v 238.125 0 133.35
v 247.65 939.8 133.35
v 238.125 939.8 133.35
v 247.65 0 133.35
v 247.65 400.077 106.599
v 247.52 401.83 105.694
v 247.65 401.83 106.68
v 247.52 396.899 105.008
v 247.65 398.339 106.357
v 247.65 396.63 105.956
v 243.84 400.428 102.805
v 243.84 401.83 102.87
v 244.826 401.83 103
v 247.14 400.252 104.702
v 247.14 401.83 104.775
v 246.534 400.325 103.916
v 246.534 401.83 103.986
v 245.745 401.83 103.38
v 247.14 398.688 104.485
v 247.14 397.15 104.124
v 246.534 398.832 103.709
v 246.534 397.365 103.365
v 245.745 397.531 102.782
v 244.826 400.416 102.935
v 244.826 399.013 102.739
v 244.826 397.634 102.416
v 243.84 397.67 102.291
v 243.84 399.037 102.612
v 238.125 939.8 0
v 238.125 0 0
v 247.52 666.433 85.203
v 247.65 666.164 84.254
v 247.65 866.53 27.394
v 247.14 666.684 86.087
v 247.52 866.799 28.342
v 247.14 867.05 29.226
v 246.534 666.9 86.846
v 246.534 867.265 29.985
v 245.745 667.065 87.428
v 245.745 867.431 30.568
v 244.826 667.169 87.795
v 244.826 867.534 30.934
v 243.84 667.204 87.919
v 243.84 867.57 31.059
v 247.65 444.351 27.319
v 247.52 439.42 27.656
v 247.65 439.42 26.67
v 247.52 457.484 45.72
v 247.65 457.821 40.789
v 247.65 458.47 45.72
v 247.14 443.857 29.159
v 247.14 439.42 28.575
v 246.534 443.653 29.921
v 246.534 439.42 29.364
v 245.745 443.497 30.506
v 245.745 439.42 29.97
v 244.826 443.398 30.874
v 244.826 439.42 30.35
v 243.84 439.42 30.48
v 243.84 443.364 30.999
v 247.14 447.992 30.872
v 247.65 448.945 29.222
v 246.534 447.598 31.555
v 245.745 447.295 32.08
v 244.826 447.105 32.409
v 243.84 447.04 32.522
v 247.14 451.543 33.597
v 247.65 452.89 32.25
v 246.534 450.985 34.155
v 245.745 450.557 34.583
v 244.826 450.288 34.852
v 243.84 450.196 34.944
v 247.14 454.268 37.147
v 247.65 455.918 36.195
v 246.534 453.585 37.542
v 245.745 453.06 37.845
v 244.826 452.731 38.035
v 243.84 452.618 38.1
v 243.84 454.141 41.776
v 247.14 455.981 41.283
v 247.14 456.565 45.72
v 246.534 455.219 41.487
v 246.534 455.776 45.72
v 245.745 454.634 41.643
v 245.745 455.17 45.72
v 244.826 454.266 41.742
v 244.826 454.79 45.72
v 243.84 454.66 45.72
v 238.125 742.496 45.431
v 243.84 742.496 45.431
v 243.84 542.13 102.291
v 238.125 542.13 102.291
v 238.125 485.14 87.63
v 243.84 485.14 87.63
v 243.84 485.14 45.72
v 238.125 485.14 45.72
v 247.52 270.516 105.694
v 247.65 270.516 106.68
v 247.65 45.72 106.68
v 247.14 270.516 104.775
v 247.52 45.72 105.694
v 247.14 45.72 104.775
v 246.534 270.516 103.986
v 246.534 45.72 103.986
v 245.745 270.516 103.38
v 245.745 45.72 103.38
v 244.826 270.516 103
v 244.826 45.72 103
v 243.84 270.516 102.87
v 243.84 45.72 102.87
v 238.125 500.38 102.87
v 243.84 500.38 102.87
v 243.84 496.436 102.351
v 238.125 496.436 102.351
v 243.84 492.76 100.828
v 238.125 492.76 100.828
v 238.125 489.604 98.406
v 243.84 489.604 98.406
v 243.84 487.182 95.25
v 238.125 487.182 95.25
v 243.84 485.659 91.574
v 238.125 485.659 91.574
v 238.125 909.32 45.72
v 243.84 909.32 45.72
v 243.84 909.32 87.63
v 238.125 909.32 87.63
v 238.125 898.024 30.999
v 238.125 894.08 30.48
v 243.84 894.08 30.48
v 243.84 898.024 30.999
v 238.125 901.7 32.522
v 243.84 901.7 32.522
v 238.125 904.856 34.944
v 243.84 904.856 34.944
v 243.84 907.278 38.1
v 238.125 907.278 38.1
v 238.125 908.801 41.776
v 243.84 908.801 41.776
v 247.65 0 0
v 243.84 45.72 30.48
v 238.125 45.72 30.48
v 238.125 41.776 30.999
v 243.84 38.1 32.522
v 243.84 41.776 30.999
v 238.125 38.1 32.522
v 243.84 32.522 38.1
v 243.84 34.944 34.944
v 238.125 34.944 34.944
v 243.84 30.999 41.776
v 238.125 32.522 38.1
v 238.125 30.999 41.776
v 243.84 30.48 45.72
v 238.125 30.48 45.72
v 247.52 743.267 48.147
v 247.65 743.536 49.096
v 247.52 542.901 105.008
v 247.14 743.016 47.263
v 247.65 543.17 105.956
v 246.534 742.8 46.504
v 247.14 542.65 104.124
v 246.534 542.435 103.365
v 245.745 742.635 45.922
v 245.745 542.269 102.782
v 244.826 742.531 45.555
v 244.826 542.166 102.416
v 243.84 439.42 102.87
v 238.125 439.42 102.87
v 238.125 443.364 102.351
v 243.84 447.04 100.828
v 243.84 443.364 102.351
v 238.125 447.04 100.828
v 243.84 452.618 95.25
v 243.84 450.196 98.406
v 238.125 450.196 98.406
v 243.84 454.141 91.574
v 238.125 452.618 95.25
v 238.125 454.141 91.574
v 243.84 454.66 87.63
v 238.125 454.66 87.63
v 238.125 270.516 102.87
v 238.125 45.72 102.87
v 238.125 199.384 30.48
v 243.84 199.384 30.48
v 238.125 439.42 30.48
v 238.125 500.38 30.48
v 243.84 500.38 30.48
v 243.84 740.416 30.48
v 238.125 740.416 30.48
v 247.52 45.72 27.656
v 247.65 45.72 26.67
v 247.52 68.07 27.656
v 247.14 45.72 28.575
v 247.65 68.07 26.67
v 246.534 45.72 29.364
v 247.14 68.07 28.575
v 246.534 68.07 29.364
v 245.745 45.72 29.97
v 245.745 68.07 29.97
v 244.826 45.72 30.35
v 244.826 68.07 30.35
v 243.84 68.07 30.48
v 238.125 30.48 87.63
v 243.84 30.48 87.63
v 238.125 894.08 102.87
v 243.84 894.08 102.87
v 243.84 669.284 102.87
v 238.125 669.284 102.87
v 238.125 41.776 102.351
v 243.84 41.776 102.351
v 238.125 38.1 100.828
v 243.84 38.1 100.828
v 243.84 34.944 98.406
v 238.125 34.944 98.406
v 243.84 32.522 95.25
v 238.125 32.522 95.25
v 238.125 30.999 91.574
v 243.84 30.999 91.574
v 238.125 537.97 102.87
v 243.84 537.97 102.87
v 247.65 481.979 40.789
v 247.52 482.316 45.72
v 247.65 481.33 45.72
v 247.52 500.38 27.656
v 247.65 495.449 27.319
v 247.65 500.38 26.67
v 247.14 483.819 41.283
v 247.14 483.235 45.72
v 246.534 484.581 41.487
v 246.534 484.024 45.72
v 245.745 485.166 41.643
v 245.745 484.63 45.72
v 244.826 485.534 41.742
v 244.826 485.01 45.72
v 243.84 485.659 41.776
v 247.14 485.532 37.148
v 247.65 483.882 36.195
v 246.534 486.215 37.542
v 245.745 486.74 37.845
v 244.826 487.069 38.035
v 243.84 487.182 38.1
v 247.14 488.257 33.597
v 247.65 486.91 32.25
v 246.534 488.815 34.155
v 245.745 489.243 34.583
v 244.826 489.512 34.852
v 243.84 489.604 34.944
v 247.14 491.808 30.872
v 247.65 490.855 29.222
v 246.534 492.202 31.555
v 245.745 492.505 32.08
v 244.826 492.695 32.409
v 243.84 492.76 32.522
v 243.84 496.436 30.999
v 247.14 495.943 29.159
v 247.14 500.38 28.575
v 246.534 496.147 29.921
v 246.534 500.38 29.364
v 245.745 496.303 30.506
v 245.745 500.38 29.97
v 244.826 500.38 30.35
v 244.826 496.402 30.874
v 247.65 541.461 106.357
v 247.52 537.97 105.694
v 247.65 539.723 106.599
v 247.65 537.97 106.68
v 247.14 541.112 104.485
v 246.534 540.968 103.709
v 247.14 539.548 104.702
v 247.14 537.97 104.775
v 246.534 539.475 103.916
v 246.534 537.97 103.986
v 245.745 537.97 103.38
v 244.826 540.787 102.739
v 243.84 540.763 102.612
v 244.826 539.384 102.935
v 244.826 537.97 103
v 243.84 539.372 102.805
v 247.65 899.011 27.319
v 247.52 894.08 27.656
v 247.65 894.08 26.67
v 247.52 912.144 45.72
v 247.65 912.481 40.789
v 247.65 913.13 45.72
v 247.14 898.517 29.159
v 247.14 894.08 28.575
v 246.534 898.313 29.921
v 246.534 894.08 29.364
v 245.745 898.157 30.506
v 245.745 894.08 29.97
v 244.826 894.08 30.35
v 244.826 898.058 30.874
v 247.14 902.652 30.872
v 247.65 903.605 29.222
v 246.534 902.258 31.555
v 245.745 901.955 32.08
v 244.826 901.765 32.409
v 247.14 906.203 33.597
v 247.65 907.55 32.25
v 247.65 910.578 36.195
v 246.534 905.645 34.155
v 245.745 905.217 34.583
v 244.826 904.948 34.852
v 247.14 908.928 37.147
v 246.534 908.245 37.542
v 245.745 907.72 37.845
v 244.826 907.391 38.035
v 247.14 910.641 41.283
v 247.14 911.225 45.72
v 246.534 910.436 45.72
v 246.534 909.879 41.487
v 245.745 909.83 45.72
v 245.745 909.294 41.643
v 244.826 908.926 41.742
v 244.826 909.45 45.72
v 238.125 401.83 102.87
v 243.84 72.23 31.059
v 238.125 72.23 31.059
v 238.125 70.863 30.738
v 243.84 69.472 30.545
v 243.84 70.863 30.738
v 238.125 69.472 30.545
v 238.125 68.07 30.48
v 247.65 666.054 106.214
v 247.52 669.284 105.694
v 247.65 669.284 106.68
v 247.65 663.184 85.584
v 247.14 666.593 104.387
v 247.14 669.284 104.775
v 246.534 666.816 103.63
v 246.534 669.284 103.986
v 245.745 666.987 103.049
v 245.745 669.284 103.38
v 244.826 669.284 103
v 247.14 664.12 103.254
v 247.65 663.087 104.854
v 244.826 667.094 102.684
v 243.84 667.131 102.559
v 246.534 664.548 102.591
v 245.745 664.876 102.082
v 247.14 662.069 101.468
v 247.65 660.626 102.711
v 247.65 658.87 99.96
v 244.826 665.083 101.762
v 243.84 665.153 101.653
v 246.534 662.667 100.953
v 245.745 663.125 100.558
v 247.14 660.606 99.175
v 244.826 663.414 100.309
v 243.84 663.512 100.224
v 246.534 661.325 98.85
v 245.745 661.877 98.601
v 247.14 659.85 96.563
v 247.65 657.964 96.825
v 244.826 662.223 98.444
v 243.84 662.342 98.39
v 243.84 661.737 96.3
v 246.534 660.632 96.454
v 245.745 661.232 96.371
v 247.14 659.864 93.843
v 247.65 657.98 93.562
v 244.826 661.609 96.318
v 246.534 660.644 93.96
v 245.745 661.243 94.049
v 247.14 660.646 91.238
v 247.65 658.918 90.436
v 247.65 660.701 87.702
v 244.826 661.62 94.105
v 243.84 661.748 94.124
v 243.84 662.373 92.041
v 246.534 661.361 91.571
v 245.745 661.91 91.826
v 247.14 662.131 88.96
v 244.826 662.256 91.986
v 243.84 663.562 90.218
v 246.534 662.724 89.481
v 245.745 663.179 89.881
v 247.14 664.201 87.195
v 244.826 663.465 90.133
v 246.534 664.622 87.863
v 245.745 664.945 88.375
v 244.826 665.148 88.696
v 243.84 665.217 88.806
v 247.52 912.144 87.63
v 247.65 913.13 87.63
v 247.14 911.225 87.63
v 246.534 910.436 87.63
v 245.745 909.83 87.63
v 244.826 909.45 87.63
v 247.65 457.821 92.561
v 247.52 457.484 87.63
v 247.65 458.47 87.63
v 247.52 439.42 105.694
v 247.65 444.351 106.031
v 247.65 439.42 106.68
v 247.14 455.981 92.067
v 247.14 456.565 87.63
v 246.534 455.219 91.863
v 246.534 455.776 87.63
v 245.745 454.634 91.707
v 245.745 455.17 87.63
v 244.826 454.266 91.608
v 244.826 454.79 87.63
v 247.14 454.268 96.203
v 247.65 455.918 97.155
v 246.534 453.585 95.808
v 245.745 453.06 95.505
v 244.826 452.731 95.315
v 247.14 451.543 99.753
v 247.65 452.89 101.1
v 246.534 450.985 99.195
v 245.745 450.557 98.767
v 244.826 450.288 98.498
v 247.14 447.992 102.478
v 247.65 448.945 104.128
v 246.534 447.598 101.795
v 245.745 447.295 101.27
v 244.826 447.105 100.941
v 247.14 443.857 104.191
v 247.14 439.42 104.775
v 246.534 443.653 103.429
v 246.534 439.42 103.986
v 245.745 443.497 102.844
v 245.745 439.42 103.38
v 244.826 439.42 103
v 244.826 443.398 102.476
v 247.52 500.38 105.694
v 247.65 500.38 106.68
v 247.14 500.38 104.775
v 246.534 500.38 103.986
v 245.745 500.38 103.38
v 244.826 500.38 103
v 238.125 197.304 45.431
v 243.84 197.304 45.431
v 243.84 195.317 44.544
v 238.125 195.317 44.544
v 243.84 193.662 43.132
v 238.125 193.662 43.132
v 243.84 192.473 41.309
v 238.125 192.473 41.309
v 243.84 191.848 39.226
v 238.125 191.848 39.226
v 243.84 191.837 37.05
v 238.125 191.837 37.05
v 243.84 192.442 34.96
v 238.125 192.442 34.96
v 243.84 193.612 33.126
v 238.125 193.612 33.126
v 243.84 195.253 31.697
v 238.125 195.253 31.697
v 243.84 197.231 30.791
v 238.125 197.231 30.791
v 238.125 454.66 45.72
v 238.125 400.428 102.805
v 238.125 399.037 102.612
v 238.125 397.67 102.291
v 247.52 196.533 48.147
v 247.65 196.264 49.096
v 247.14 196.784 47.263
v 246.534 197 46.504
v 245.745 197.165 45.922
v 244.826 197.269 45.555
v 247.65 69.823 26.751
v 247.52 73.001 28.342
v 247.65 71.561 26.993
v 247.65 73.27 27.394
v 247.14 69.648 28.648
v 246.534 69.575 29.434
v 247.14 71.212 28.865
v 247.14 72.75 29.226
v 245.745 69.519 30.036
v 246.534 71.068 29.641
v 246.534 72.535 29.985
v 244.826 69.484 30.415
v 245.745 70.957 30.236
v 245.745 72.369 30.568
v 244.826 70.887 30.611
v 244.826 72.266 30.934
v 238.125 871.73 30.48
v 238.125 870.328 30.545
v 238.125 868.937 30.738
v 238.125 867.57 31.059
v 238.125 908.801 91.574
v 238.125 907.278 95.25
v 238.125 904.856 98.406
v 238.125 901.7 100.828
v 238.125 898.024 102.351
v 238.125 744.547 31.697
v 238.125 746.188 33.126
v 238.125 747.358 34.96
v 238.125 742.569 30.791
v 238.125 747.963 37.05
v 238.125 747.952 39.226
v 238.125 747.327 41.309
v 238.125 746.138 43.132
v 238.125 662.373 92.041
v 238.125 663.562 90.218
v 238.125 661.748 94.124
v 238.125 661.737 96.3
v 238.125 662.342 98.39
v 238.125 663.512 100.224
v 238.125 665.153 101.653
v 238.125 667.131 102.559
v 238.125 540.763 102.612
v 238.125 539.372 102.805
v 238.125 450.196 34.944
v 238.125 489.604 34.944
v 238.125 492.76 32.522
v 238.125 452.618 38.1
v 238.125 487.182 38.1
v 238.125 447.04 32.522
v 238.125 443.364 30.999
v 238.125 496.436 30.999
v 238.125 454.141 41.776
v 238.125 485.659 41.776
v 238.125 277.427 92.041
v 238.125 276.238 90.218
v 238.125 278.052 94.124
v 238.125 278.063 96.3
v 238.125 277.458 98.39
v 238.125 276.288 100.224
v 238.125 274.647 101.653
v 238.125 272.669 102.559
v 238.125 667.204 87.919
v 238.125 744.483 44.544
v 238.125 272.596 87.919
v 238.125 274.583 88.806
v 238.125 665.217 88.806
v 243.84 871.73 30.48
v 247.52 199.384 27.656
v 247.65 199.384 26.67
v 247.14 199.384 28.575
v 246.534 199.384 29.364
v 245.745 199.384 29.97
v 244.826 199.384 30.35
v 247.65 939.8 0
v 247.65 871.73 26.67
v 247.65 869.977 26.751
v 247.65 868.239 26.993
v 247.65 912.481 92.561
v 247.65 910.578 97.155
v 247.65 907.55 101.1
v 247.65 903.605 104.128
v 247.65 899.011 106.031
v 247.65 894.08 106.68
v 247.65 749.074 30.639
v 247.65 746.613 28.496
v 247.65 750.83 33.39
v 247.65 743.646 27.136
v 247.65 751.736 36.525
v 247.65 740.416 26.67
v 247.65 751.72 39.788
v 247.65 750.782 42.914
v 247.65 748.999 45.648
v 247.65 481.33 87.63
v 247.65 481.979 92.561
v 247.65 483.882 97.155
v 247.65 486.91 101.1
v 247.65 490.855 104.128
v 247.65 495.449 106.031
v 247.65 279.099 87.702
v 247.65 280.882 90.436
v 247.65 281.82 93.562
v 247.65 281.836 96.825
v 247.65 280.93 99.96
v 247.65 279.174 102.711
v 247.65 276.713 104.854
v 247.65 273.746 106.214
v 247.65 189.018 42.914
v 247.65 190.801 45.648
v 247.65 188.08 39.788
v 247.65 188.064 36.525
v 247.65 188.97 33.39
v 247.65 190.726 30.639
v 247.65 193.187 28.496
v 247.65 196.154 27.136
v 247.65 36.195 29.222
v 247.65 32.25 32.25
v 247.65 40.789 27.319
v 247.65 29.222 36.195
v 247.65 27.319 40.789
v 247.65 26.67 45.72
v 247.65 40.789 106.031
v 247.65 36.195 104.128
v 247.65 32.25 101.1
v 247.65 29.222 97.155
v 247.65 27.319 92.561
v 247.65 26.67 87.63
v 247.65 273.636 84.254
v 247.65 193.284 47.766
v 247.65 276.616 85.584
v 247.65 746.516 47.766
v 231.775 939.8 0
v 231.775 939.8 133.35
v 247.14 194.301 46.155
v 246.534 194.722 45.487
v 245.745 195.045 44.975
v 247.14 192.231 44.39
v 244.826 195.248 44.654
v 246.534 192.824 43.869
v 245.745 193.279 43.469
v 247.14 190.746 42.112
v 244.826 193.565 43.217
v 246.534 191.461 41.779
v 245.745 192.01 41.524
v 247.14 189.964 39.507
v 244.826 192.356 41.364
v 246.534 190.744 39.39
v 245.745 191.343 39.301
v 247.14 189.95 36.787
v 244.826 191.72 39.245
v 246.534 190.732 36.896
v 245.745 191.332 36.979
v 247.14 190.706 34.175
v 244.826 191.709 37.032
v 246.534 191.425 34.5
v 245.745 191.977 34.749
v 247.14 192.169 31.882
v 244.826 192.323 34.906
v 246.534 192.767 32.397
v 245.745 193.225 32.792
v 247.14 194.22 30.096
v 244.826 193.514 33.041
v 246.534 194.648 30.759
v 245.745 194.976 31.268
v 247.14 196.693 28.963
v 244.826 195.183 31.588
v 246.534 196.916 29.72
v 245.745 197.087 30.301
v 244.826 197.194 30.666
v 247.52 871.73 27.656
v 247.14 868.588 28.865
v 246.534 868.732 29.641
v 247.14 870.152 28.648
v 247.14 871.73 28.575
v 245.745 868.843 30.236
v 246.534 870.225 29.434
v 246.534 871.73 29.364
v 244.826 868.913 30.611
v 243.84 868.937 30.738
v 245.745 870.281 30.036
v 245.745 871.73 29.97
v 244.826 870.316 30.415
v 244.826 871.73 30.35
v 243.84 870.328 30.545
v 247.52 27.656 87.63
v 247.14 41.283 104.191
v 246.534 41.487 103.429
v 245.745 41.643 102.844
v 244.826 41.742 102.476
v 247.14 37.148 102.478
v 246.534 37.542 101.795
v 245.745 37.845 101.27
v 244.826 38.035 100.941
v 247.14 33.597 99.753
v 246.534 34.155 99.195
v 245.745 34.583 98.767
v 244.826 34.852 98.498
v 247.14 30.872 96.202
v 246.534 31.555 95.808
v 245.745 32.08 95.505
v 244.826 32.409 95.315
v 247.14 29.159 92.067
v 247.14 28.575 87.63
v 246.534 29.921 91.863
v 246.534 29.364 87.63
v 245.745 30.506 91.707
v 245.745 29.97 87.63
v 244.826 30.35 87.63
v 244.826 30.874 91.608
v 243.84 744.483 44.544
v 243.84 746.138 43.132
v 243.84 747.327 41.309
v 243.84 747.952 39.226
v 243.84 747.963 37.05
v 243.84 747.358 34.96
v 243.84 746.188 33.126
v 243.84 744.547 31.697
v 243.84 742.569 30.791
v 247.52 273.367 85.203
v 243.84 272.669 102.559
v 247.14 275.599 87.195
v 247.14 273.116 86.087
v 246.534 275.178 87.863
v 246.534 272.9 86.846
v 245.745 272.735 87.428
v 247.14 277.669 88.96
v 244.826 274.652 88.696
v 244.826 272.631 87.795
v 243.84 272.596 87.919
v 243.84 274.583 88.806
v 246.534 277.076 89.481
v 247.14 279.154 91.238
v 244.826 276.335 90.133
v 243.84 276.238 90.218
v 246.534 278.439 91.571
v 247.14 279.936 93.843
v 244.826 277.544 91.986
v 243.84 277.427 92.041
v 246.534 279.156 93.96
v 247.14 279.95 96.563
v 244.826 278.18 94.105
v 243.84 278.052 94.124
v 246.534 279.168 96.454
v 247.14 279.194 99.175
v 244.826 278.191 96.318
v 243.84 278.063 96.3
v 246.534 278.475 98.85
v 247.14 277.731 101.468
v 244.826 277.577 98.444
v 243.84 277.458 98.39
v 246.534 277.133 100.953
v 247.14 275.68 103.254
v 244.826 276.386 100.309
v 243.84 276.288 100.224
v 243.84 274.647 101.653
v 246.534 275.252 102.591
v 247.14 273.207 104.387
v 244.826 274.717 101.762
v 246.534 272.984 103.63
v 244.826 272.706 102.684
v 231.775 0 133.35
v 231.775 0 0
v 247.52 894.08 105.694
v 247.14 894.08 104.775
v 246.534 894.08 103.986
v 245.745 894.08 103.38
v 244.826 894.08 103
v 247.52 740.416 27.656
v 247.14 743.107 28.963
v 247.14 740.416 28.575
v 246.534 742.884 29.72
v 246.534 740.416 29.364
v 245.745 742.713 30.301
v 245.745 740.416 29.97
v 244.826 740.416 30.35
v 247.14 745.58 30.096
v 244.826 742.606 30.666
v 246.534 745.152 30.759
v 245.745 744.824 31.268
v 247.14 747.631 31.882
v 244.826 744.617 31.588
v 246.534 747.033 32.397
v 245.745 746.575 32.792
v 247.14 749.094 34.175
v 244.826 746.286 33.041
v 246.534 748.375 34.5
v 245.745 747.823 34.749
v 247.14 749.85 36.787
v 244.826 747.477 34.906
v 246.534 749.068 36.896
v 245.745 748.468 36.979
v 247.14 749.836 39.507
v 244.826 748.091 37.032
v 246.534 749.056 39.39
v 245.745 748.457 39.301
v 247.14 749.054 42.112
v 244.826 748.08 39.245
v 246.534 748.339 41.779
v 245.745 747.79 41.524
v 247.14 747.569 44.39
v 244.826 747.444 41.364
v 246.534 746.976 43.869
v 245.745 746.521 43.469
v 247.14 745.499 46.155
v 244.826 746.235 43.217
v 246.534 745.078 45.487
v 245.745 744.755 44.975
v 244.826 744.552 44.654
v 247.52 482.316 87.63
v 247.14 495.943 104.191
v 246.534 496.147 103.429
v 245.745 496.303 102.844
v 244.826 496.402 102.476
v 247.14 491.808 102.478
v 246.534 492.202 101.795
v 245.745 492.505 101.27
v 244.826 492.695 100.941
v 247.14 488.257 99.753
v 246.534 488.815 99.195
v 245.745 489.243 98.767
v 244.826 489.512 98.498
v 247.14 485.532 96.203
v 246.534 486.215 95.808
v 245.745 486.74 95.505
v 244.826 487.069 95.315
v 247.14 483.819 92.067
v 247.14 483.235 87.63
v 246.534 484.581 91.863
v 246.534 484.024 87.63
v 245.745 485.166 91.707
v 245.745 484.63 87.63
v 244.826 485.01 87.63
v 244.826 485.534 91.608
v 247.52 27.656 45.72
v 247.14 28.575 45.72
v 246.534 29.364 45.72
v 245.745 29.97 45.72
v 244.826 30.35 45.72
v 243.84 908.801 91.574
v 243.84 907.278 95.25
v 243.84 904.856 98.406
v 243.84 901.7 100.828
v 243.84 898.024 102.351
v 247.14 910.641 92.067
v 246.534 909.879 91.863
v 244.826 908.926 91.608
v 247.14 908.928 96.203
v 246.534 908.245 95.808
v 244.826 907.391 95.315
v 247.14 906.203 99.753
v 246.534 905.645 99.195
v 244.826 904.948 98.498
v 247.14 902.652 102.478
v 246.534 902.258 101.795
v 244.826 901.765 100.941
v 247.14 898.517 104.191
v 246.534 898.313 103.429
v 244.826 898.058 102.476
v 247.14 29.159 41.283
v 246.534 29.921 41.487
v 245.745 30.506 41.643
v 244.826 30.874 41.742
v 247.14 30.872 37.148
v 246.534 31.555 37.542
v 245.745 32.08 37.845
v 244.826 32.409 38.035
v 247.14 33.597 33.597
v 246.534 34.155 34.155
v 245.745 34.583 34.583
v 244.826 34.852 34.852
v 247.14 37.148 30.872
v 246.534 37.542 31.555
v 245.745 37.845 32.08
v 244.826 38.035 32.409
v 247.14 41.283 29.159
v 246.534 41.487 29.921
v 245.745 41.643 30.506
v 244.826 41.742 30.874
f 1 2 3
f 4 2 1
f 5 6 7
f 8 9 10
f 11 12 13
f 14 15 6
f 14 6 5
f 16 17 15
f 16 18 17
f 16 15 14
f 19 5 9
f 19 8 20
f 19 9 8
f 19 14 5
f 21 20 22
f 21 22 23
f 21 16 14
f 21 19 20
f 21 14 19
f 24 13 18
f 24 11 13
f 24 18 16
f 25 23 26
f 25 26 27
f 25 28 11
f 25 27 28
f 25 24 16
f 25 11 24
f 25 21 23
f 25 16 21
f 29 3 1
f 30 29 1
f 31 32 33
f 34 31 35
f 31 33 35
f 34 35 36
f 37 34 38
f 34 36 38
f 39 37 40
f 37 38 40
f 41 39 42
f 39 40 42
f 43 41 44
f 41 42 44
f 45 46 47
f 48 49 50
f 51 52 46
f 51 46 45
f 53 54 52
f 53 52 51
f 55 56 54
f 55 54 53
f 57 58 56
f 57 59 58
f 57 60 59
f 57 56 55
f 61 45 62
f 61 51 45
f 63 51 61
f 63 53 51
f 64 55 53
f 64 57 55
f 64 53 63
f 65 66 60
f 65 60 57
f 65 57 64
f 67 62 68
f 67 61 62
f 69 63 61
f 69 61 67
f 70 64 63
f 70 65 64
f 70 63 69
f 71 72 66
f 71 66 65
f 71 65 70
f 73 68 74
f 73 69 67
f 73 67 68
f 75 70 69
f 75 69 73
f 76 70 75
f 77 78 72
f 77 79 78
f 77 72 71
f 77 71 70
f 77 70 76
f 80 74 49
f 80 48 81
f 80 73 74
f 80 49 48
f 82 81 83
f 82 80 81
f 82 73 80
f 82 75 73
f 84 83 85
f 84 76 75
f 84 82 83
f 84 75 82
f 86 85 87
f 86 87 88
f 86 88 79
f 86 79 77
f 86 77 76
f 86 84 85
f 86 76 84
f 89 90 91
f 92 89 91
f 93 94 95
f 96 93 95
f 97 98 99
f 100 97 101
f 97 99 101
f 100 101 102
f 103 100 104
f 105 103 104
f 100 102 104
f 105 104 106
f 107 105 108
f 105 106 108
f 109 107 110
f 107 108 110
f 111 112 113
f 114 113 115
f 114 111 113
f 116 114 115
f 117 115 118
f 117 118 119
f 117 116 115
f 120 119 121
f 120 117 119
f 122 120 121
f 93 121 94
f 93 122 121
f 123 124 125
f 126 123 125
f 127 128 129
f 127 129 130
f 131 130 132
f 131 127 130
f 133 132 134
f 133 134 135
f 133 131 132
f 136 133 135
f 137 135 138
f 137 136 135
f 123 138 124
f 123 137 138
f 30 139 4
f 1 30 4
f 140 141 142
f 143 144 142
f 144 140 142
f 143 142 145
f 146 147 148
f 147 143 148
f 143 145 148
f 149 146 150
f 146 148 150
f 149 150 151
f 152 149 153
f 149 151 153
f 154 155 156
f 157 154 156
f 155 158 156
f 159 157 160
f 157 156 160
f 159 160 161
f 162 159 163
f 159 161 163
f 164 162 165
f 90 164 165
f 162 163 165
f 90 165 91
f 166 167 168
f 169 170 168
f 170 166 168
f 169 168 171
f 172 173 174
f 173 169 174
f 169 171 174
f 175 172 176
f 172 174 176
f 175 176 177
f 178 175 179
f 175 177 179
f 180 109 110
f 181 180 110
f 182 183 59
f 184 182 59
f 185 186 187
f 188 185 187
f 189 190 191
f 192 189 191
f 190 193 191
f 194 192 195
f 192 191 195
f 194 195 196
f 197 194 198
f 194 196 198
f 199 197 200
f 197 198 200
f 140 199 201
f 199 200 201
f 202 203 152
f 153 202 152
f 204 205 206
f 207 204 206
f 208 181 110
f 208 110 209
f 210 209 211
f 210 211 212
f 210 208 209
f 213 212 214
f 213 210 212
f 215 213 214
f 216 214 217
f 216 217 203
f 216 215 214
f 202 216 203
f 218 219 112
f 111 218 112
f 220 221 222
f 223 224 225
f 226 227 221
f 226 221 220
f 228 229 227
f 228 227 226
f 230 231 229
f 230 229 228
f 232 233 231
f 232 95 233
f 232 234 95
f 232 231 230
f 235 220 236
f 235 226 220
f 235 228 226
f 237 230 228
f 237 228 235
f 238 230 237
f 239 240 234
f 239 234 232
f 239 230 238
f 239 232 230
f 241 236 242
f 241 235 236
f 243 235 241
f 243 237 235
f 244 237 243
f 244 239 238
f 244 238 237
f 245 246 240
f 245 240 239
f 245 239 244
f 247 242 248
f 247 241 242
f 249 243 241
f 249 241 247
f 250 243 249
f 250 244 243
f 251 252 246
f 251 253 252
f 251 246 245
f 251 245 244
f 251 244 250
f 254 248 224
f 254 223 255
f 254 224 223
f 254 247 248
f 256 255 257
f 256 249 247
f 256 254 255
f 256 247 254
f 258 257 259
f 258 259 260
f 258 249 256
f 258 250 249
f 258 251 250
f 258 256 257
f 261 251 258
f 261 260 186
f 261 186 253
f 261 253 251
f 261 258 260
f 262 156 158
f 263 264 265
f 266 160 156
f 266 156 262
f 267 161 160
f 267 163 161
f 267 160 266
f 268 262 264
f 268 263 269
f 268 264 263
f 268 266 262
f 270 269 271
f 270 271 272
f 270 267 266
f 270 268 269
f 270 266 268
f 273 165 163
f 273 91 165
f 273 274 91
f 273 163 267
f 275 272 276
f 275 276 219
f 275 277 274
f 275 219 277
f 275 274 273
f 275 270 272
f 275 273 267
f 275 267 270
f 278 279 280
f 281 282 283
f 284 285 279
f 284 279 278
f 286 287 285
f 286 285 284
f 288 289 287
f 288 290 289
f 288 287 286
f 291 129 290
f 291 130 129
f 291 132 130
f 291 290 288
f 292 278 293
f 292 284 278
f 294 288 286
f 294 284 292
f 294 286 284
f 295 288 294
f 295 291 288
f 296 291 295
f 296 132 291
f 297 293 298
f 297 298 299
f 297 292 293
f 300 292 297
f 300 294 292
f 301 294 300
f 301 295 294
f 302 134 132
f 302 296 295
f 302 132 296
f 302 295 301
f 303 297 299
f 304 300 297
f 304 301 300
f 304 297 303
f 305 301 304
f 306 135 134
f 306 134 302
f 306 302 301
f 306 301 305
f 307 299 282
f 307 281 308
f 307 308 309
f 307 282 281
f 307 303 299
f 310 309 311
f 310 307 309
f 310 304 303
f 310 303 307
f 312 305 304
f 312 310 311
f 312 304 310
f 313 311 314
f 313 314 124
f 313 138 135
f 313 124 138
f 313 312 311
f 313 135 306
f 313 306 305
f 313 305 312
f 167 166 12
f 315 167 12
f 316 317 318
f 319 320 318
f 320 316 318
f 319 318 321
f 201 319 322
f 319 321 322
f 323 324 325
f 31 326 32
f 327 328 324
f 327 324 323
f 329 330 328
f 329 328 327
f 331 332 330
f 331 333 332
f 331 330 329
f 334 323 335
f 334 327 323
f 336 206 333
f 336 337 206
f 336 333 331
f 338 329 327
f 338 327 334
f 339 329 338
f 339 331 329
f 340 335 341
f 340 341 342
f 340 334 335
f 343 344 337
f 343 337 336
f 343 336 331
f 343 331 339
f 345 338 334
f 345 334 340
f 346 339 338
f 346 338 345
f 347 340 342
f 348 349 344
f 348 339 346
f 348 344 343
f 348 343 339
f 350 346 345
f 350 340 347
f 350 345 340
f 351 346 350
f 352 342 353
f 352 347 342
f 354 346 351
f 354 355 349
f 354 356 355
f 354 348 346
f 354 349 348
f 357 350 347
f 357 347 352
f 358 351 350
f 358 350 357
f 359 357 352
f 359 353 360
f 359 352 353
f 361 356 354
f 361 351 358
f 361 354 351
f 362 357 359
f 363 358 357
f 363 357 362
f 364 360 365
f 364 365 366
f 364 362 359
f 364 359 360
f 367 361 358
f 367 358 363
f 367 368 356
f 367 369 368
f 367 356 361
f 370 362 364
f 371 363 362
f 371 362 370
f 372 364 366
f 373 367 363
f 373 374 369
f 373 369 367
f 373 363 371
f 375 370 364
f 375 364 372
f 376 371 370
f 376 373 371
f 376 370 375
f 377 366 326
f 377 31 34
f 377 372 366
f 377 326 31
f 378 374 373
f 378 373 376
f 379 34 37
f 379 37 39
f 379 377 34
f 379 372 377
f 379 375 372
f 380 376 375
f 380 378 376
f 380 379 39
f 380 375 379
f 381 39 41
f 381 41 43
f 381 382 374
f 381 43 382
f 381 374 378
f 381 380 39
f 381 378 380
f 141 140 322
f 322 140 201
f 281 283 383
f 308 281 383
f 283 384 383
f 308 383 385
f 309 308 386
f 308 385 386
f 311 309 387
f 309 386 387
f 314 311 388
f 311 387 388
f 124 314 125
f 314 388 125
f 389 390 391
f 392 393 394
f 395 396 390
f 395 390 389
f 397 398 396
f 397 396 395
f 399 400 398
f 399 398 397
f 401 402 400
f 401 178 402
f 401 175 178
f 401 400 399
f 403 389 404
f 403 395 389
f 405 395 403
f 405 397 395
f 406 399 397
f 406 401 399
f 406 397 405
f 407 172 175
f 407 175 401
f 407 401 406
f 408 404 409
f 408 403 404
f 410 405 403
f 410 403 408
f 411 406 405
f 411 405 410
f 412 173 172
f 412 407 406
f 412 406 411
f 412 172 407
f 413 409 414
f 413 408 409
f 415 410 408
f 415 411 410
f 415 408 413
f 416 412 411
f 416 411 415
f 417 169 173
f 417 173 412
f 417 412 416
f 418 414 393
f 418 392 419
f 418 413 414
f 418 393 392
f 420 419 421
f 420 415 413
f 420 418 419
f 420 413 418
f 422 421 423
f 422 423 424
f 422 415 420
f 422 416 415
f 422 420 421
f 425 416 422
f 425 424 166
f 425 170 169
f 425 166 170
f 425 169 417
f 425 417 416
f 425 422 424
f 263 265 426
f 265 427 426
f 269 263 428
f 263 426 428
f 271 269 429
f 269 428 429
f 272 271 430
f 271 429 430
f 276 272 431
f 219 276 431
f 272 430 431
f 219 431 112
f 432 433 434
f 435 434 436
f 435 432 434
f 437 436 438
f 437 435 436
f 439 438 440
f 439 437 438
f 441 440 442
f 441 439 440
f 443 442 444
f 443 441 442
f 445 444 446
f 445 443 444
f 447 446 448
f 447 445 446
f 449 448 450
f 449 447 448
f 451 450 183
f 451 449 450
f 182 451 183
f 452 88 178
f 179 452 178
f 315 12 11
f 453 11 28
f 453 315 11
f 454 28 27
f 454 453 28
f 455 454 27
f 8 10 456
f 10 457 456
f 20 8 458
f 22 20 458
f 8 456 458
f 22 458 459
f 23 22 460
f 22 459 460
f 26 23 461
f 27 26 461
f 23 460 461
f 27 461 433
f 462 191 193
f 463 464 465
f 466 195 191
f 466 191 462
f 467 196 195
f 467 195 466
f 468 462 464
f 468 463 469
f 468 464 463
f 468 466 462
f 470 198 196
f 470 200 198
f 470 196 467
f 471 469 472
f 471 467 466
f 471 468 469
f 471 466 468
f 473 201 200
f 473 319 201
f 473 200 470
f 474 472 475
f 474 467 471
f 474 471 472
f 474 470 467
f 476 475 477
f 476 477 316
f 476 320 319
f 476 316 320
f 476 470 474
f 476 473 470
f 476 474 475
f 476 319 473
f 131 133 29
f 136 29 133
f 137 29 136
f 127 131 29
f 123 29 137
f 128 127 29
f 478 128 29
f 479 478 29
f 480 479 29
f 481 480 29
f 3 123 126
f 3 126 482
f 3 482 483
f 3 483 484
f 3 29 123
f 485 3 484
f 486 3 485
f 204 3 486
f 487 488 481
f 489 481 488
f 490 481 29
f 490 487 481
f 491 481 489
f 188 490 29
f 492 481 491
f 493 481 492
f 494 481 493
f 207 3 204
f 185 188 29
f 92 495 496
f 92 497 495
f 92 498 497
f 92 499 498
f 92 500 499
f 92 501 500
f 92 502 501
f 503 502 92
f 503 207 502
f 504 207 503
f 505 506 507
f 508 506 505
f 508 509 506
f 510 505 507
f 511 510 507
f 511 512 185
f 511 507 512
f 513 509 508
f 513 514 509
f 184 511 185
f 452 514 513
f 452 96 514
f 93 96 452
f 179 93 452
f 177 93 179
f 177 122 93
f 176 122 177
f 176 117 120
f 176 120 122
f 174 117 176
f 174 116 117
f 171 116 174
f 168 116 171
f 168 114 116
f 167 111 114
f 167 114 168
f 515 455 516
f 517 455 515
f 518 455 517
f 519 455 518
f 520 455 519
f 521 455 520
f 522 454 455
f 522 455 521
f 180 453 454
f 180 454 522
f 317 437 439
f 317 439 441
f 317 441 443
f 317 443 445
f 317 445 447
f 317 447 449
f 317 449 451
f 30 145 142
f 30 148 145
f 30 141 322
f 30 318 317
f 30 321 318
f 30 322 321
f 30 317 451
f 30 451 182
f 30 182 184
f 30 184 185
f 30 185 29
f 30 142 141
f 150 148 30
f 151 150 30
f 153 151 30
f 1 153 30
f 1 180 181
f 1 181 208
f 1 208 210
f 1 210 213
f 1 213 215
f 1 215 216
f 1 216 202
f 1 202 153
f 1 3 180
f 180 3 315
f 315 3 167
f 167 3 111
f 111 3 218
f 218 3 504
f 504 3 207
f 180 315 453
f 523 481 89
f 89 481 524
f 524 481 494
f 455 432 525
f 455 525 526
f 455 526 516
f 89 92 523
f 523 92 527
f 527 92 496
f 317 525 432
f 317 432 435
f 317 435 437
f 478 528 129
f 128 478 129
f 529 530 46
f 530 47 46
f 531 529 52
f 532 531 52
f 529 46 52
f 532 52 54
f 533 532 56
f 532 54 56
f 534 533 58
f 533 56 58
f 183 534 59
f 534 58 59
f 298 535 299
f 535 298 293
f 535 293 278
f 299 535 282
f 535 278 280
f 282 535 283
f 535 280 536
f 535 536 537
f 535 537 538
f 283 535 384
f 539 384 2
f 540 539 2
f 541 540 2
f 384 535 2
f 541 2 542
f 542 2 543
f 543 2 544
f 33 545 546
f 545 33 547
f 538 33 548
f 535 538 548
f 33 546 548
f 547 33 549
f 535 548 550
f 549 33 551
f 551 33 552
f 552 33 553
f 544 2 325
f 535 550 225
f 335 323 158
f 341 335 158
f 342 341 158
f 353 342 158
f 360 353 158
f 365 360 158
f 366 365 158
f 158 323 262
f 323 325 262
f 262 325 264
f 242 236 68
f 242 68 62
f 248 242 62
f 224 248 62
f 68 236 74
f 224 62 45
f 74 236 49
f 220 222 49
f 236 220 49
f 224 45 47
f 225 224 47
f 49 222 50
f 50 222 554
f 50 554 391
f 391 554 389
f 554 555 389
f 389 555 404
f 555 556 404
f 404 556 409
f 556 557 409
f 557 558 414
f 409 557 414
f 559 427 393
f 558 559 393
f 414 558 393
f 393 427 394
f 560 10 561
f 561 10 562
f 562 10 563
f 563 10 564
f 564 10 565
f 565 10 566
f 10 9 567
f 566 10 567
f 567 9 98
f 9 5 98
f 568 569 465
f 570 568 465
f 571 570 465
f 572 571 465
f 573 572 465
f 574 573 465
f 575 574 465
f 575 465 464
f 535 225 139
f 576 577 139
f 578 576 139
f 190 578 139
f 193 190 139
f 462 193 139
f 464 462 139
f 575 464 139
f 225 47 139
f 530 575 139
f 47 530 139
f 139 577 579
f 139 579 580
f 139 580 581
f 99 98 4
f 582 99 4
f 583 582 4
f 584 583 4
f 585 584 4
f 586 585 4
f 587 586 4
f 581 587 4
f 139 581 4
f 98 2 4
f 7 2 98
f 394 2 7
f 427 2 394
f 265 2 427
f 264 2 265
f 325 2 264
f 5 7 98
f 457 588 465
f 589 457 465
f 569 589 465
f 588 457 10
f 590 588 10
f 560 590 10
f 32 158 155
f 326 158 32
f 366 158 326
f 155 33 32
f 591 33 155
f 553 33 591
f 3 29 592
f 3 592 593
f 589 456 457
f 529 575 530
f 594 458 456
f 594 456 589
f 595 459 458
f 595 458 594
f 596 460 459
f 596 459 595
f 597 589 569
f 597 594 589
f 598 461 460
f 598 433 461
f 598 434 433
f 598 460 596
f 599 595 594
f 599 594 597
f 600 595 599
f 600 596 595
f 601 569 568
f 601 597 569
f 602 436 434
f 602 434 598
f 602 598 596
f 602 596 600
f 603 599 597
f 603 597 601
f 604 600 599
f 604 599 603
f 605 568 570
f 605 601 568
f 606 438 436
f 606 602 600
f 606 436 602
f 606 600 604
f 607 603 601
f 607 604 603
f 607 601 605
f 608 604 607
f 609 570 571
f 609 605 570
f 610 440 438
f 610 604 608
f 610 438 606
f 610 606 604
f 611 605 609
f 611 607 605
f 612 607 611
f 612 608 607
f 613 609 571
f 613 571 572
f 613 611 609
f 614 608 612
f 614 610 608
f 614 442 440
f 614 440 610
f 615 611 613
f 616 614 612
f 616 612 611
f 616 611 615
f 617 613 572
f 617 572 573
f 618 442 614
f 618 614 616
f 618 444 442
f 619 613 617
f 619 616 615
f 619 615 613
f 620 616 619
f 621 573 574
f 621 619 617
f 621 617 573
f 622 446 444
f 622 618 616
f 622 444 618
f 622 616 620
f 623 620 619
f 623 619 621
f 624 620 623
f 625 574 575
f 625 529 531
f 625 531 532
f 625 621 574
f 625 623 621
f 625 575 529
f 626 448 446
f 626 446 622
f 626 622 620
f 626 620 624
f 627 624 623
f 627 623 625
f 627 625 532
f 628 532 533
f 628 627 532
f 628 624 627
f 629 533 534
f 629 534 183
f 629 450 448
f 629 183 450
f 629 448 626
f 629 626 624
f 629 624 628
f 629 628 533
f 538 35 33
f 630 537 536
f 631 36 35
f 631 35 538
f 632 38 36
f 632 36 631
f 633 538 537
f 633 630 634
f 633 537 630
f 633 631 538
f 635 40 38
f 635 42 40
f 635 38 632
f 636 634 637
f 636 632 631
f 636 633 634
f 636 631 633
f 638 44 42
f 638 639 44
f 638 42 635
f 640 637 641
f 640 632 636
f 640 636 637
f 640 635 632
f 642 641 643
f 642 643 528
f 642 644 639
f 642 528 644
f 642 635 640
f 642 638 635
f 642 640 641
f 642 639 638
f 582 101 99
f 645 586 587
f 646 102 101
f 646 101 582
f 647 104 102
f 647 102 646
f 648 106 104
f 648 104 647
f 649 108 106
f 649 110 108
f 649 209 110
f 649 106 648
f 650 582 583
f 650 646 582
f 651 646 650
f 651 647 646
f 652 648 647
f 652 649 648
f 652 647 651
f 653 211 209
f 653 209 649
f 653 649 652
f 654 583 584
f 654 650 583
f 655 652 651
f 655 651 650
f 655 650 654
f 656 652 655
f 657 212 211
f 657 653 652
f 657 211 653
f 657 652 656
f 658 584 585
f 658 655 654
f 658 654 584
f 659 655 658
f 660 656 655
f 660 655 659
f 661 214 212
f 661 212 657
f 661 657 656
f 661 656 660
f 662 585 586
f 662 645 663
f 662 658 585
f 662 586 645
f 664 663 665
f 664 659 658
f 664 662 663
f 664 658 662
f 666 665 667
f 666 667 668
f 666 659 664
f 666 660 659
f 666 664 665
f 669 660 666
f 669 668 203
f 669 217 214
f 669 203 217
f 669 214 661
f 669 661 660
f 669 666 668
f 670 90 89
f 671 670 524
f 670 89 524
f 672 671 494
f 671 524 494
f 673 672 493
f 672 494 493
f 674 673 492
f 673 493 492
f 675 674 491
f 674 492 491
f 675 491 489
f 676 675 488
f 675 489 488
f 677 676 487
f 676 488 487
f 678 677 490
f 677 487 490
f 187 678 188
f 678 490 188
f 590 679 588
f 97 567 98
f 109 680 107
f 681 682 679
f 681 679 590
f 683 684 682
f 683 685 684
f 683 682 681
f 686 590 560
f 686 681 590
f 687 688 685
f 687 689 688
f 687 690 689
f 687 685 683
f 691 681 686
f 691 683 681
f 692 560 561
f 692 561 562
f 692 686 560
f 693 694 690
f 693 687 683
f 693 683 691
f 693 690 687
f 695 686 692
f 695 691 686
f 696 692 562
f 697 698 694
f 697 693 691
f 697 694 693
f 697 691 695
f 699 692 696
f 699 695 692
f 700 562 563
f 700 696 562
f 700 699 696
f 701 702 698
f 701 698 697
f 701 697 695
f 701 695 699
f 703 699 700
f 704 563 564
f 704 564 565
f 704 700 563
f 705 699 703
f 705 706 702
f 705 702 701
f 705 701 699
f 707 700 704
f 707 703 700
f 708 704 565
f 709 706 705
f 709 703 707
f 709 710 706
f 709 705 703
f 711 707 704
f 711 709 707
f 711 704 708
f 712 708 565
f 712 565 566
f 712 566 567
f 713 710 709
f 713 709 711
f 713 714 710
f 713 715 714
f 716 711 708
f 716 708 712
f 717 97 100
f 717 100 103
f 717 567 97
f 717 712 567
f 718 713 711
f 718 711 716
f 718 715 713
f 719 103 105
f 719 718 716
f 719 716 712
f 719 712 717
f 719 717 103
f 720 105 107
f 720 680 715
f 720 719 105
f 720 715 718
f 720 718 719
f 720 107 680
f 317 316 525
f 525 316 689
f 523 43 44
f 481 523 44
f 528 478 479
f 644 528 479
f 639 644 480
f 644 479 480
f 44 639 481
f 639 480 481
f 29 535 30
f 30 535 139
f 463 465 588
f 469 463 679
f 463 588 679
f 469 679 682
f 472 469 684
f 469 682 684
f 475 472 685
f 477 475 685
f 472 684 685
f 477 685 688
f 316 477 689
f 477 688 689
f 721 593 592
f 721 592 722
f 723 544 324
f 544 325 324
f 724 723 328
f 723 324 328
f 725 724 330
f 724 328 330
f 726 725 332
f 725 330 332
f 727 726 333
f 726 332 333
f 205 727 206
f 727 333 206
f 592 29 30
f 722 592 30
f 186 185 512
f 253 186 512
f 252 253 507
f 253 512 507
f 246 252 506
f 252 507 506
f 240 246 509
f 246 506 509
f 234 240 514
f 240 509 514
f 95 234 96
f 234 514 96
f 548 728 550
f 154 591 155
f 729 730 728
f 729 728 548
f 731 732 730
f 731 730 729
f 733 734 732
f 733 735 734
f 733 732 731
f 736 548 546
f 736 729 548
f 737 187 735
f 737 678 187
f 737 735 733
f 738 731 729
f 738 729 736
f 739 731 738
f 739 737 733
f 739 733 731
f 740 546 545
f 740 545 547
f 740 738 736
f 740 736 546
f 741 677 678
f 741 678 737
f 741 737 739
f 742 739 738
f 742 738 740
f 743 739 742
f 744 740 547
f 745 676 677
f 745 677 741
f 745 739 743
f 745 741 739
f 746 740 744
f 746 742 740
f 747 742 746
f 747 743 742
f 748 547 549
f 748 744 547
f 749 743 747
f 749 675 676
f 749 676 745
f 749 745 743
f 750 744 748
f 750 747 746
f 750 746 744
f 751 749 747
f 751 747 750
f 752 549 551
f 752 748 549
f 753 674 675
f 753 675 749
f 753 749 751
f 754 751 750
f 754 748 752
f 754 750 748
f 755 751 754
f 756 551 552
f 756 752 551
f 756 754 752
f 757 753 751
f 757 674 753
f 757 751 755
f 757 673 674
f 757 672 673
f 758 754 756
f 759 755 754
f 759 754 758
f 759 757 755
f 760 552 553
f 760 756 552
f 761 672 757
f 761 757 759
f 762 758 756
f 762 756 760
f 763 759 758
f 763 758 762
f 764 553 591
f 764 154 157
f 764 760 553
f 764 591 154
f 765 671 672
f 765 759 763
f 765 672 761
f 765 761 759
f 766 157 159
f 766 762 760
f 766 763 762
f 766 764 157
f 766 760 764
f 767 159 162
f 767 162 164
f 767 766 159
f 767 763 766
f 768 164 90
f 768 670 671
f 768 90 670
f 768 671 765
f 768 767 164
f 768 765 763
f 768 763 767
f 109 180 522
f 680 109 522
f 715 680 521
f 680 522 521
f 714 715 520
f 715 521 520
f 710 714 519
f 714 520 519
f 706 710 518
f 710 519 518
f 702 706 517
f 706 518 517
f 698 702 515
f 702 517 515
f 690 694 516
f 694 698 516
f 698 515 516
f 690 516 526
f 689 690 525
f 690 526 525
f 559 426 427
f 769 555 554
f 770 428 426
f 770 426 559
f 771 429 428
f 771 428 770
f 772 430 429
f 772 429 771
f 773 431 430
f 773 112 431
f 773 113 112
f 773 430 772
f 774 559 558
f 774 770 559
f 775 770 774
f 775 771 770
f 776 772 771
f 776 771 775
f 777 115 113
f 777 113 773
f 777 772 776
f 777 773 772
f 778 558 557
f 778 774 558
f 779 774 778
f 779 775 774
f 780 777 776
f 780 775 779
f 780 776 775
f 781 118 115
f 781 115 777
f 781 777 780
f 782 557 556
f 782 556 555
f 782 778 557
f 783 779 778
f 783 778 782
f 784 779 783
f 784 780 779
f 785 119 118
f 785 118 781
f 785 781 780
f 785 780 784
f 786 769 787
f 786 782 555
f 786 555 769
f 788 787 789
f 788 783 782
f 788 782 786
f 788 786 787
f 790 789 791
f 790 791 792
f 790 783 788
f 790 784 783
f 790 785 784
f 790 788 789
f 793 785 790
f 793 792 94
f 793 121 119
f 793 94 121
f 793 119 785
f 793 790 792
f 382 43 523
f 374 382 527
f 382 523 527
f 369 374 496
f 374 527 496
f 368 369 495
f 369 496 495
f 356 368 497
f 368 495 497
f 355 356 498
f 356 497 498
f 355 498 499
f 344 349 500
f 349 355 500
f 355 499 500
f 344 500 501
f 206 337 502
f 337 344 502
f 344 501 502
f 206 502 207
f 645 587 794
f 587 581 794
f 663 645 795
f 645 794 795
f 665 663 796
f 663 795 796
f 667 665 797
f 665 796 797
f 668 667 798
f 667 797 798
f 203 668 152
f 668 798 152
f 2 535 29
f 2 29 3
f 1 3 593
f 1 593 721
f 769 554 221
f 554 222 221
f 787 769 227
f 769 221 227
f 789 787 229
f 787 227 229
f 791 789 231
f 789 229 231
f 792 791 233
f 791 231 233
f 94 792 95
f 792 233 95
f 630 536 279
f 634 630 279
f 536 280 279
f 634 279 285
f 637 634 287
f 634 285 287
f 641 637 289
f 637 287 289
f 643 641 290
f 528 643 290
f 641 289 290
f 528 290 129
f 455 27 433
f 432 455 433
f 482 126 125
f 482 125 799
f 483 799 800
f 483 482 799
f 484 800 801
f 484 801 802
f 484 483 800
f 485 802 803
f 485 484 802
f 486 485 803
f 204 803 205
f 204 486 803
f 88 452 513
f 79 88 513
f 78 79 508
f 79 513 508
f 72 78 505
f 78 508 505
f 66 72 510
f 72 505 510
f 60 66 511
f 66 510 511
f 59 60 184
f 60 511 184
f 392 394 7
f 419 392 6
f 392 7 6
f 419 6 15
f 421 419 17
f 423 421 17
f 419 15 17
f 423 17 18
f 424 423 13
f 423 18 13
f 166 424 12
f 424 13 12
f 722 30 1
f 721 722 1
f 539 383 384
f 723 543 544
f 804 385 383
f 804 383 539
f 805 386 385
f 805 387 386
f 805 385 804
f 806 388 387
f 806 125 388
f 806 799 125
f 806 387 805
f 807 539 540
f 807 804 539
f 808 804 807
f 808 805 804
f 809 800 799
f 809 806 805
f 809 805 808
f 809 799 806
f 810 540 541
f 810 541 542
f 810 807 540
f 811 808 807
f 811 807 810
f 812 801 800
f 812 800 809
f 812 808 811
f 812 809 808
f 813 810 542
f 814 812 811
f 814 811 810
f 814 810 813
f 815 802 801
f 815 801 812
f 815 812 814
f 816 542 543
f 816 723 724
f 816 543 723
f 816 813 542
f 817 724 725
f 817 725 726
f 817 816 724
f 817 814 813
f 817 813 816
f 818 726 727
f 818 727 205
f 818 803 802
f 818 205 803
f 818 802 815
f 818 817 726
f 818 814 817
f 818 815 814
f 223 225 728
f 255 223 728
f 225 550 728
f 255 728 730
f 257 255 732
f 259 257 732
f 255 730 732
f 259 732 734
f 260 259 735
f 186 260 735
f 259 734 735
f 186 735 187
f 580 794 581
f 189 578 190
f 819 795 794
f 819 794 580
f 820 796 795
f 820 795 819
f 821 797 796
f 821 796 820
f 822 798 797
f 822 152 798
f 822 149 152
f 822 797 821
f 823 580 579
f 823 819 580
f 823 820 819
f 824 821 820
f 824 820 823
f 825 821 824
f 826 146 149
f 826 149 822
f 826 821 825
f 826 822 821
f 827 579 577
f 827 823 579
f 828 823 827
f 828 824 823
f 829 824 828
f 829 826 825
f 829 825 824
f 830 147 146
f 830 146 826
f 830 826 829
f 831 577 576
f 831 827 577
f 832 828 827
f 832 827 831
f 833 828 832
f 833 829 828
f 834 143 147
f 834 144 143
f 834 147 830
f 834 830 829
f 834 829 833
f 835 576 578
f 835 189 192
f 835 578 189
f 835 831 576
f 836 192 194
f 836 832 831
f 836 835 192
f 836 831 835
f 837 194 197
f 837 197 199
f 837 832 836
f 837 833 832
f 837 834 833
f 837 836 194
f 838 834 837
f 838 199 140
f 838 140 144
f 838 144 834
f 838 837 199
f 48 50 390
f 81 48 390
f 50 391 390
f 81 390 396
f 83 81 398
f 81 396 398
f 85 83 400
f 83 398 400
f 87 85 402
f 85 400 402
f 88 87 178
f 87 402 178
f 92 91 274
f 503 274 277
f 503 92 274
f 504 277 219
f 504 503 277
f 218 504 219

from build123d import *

# Parameters (mm, degrees)
F2_W     = 939.8
F2_H     = 133.35
F3_DEPTH = 9.525
F4_R     = 15.24
F5_R     = 7.62
F6_R     = 3.81
F7_W     = 939.8
F7_H     = 133.35
F8_DEPTH = 6.35


with BuildPart() as f3:
    # F2 (on face) → F3 (new body)
    with BuildSketch(Plane(origin=(247.65, 0, 0), x_dir=(0, -1, 0), z_dir=(-1, 0, 0))):
        with Locations((-469.9, 66.675)):
            Rectangle(F2_W, F2_H)
        Polygon((-909.32, 30.48), (-909.32, 102.87), (-614.5213290809, 102.87), (-869.6099005094, 30.48), align=None, mode=Mode.SUBTRACT)
        Polygon((-540.0900994906, 102.87), (-485.14, 102.87), (-485.14, 30.48), (-795.1786709191, 30.48), align=None, mode=Mode.SUBTRACT)
        Polygon((-399.7099005094, 102.87), (-144.6213290809, 30.48), (-454.66, 30.48), (-454.66, 102.87), align=None, mode=Mode.SUBTRACT)
        Polygon((-30.48, 102.87), (-30.48, 30.48), (-70.1900994906, 30.48), (-325.2786709191, 102.87), align=None, mode=Mode.SUBTRACT)
    extrude(amount=F3_DEPTH)

    # F4
    f4_edges = [f3.edges().sort_by_distance(p)[0] for p in [
        (242.8875, 399.709901, 102.87),
        (242.8875, 454.66, 102.87),
        (242.8875, 454.66, 30.48),
        (242.8875, 30.48, 30.48),
        (242.8875, 30.48, 102.87),
        (242.8875, 70.190099, 30.48),
        (242.8875, 540.090099, 102.87),
        (242.8875, 485.14, 102.87),
        (242.8875, 485.14, 30.48),
        (242.8875, 909.32, 102.87),
        (242.8875, 909.32, 30.48),
        (242.8875, 869.609901, 30.48),
    ]]
    fillet(f4_edges, radius=F4_R)

    # F5
    f5_edges = [f3.edges().sort_by_distance(p)[0] for p in [
        (242.8875, 144.621329, 30.48),
        (242.8875, 614.521329, 102.87),
        (242.8875, 795.178671, 30.48),
        (242.8875, 325.278671, 102.87),
    ]]
    fillet(f5_edges, radius=F5_R)

    # F6
    f6_edges = [f3.edges().sort_by_distance(p)[0] for p in [
        (247.65, 158.117766, 102.87),
        (247.65, 297.487035, 73.860808),
        (247.65, 519.174767, 102.87),
        (247.65, 781.682234, 102.87),
    ]]
    fillet(f6_edges, radius=F6_R)


with BuildPart() as f8:
    # F7 (on face) → F8 (new body)
    with BuildSketch(Plane(origin=(238.125, 0, 0), x_dir=(0, -1, 0), z_dir=(-1, 0, 0))):
        with Locations((-469.9, 66.675)):
            Rectangle(F7_W, F7_H)
    extrude(amount=F8_DEPTH)


solid = Compound([f3.part, f8.part])
